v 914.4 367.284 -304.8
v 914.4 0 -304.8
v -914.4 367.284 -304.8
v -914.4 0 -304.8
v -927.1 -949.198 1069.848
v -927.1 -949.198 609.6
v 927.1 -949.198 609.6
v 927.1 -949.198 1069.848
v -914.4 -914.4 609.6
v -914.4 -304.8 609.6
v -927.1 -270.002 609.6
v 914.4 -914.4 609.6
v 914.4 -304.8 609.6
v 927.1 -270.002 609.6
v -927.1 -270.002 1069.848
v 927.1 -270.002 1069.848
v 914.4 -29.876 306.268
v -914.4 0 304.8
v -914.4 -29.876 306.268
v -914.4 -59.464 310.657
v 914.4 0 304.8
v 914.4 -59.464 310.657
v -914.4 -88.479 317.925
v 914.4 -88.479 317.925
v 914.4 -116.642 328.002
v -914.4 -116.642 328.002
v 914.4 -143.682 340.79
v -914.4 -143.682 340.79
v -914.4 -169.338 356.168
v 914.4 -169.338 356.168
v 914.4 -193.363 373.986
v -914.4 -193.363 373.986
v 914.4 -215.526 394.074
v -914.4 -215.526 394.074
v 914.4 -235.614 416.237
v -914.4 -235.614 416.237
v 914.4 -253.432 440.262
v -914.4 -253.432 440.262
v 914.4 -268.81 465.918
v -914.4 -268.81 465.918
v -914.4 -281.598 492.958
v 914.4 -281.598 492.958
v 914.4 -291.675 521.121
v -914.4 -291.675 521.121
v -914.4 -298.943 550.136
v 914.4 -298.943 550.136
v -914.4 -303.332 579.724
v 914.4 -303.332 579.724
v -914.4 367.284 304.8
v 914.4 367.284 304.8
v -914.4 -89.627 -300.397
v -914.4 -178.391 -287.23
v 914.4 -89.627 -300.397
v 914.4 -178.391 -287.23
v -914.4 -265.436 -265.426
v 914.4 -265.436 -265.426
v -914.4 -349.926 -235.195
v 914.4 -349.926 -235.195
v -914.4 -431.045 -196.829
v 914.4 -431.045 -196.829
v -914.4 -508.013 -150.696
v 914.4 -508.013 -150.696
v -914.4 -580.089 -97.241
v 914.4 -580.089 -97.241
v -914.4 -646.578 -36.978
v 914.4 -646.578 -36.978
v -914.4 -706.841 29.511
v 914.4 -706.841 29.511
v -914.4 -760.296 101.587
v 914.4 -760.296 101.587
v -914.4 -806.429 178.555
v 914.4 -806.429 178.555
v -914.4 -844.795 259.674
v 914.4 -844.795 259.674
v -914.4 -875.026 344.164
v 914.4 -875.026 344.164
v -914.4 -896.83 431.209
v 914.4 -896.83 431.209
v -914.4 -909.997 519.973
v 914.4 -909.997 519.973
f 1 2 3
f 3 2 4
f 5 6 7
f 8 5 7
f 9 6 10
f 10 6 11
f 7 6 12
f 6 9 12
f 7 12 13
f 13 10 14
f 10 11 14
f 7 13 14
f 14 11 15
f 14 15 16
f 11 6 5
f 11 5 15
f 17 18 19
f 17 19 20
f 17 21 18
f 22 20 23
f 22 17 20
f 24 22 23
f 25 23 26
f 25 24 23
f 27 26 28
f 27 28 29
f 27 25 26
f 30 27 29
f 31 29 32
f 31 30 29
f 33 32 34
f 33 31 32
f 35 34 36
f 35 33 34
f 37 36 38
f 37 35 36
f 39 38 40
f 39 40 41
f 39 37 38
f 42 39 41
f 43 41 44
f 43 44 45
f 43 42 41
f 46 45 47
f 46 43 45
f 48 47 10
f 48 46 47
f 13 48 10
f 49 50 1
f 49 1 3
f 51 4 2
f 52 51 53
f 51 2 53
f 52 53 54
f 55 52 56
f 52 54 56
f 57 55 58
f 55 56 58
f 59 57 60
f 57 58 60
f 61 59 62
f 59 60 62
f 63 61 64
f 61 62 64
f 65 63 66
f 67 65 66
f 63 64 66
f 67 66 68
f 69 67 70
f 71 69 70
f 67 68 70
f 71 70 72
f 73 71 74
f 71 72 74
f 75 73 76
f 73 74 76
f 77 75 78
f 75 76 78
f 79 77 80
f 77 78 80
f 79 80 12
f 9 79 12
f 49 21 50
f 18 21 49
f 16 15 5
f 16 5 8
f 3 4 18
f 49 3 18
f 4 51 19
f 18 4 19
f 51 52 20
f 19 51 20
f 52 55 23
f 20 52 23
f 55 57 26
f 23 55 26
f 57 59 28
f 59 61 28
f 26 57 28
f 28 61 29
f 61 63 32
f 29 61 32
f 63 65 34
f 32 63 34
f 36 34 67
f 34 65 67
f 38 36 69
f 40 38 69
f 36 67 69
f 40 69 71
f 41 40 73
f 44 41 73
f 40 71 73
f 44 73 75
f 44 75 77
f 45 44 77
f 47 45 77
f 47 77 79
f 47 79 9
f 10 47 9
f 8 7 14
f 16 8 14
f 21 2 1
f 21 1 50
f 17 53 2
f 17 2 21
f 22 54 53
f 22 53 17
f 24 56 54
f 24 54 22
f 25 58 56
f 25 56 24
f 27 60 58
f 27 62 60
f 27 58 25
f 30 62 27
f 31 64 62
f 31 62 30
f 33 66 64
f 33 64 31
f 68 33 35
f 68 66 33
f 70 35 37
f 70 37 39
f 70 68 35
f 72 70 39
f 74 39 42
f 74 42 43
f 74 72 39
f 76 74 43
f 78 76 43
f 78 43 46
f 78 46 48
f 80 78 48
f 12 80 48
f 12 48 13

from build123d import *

# Parameters (mm, degrees)
F0_W      = 1828.8
F0_H      = 609.6
F2_ANGLE  = 90
F2_FACE_W = 1828.8
F2_FACE_H = 609.6
F3_DEPTH  = 367.284
F4_W      = 1854.2
F4_H      = 679.196
F5_DEPTH  = 460.248


with BuildPart() as f2:
    # F0 (on Front) → F2 (revolve)
    with BuildSketch(Plane.XZ):
        Rectangle(F0_W, F0_H)
    revolve(axis=Axis((-199.10112, 0, 609.6), (-1, 0, 0)), revolution_arc=F2_ANGLE)

    # F2_face (on face) → F3 (join)
    with BuildSketch(Plane(origin=(0, 0, 0), x_dir=(-1, 0, 0), z_dir=(0, 1, 0))):
        Rectangle(F2_FACE_W, F2_FACE_H)
    extrude(amount=F3_DEPTH)

    # F4 (on face) → F5 (join)
    with BuildSketch(Plane.XY.offset(609.6)):
        with Locations((0, -609.6)):
            Rectangle(F4_W, F4_H)
    extrude(amount=F5_DEPTH)


solid = f2.part
